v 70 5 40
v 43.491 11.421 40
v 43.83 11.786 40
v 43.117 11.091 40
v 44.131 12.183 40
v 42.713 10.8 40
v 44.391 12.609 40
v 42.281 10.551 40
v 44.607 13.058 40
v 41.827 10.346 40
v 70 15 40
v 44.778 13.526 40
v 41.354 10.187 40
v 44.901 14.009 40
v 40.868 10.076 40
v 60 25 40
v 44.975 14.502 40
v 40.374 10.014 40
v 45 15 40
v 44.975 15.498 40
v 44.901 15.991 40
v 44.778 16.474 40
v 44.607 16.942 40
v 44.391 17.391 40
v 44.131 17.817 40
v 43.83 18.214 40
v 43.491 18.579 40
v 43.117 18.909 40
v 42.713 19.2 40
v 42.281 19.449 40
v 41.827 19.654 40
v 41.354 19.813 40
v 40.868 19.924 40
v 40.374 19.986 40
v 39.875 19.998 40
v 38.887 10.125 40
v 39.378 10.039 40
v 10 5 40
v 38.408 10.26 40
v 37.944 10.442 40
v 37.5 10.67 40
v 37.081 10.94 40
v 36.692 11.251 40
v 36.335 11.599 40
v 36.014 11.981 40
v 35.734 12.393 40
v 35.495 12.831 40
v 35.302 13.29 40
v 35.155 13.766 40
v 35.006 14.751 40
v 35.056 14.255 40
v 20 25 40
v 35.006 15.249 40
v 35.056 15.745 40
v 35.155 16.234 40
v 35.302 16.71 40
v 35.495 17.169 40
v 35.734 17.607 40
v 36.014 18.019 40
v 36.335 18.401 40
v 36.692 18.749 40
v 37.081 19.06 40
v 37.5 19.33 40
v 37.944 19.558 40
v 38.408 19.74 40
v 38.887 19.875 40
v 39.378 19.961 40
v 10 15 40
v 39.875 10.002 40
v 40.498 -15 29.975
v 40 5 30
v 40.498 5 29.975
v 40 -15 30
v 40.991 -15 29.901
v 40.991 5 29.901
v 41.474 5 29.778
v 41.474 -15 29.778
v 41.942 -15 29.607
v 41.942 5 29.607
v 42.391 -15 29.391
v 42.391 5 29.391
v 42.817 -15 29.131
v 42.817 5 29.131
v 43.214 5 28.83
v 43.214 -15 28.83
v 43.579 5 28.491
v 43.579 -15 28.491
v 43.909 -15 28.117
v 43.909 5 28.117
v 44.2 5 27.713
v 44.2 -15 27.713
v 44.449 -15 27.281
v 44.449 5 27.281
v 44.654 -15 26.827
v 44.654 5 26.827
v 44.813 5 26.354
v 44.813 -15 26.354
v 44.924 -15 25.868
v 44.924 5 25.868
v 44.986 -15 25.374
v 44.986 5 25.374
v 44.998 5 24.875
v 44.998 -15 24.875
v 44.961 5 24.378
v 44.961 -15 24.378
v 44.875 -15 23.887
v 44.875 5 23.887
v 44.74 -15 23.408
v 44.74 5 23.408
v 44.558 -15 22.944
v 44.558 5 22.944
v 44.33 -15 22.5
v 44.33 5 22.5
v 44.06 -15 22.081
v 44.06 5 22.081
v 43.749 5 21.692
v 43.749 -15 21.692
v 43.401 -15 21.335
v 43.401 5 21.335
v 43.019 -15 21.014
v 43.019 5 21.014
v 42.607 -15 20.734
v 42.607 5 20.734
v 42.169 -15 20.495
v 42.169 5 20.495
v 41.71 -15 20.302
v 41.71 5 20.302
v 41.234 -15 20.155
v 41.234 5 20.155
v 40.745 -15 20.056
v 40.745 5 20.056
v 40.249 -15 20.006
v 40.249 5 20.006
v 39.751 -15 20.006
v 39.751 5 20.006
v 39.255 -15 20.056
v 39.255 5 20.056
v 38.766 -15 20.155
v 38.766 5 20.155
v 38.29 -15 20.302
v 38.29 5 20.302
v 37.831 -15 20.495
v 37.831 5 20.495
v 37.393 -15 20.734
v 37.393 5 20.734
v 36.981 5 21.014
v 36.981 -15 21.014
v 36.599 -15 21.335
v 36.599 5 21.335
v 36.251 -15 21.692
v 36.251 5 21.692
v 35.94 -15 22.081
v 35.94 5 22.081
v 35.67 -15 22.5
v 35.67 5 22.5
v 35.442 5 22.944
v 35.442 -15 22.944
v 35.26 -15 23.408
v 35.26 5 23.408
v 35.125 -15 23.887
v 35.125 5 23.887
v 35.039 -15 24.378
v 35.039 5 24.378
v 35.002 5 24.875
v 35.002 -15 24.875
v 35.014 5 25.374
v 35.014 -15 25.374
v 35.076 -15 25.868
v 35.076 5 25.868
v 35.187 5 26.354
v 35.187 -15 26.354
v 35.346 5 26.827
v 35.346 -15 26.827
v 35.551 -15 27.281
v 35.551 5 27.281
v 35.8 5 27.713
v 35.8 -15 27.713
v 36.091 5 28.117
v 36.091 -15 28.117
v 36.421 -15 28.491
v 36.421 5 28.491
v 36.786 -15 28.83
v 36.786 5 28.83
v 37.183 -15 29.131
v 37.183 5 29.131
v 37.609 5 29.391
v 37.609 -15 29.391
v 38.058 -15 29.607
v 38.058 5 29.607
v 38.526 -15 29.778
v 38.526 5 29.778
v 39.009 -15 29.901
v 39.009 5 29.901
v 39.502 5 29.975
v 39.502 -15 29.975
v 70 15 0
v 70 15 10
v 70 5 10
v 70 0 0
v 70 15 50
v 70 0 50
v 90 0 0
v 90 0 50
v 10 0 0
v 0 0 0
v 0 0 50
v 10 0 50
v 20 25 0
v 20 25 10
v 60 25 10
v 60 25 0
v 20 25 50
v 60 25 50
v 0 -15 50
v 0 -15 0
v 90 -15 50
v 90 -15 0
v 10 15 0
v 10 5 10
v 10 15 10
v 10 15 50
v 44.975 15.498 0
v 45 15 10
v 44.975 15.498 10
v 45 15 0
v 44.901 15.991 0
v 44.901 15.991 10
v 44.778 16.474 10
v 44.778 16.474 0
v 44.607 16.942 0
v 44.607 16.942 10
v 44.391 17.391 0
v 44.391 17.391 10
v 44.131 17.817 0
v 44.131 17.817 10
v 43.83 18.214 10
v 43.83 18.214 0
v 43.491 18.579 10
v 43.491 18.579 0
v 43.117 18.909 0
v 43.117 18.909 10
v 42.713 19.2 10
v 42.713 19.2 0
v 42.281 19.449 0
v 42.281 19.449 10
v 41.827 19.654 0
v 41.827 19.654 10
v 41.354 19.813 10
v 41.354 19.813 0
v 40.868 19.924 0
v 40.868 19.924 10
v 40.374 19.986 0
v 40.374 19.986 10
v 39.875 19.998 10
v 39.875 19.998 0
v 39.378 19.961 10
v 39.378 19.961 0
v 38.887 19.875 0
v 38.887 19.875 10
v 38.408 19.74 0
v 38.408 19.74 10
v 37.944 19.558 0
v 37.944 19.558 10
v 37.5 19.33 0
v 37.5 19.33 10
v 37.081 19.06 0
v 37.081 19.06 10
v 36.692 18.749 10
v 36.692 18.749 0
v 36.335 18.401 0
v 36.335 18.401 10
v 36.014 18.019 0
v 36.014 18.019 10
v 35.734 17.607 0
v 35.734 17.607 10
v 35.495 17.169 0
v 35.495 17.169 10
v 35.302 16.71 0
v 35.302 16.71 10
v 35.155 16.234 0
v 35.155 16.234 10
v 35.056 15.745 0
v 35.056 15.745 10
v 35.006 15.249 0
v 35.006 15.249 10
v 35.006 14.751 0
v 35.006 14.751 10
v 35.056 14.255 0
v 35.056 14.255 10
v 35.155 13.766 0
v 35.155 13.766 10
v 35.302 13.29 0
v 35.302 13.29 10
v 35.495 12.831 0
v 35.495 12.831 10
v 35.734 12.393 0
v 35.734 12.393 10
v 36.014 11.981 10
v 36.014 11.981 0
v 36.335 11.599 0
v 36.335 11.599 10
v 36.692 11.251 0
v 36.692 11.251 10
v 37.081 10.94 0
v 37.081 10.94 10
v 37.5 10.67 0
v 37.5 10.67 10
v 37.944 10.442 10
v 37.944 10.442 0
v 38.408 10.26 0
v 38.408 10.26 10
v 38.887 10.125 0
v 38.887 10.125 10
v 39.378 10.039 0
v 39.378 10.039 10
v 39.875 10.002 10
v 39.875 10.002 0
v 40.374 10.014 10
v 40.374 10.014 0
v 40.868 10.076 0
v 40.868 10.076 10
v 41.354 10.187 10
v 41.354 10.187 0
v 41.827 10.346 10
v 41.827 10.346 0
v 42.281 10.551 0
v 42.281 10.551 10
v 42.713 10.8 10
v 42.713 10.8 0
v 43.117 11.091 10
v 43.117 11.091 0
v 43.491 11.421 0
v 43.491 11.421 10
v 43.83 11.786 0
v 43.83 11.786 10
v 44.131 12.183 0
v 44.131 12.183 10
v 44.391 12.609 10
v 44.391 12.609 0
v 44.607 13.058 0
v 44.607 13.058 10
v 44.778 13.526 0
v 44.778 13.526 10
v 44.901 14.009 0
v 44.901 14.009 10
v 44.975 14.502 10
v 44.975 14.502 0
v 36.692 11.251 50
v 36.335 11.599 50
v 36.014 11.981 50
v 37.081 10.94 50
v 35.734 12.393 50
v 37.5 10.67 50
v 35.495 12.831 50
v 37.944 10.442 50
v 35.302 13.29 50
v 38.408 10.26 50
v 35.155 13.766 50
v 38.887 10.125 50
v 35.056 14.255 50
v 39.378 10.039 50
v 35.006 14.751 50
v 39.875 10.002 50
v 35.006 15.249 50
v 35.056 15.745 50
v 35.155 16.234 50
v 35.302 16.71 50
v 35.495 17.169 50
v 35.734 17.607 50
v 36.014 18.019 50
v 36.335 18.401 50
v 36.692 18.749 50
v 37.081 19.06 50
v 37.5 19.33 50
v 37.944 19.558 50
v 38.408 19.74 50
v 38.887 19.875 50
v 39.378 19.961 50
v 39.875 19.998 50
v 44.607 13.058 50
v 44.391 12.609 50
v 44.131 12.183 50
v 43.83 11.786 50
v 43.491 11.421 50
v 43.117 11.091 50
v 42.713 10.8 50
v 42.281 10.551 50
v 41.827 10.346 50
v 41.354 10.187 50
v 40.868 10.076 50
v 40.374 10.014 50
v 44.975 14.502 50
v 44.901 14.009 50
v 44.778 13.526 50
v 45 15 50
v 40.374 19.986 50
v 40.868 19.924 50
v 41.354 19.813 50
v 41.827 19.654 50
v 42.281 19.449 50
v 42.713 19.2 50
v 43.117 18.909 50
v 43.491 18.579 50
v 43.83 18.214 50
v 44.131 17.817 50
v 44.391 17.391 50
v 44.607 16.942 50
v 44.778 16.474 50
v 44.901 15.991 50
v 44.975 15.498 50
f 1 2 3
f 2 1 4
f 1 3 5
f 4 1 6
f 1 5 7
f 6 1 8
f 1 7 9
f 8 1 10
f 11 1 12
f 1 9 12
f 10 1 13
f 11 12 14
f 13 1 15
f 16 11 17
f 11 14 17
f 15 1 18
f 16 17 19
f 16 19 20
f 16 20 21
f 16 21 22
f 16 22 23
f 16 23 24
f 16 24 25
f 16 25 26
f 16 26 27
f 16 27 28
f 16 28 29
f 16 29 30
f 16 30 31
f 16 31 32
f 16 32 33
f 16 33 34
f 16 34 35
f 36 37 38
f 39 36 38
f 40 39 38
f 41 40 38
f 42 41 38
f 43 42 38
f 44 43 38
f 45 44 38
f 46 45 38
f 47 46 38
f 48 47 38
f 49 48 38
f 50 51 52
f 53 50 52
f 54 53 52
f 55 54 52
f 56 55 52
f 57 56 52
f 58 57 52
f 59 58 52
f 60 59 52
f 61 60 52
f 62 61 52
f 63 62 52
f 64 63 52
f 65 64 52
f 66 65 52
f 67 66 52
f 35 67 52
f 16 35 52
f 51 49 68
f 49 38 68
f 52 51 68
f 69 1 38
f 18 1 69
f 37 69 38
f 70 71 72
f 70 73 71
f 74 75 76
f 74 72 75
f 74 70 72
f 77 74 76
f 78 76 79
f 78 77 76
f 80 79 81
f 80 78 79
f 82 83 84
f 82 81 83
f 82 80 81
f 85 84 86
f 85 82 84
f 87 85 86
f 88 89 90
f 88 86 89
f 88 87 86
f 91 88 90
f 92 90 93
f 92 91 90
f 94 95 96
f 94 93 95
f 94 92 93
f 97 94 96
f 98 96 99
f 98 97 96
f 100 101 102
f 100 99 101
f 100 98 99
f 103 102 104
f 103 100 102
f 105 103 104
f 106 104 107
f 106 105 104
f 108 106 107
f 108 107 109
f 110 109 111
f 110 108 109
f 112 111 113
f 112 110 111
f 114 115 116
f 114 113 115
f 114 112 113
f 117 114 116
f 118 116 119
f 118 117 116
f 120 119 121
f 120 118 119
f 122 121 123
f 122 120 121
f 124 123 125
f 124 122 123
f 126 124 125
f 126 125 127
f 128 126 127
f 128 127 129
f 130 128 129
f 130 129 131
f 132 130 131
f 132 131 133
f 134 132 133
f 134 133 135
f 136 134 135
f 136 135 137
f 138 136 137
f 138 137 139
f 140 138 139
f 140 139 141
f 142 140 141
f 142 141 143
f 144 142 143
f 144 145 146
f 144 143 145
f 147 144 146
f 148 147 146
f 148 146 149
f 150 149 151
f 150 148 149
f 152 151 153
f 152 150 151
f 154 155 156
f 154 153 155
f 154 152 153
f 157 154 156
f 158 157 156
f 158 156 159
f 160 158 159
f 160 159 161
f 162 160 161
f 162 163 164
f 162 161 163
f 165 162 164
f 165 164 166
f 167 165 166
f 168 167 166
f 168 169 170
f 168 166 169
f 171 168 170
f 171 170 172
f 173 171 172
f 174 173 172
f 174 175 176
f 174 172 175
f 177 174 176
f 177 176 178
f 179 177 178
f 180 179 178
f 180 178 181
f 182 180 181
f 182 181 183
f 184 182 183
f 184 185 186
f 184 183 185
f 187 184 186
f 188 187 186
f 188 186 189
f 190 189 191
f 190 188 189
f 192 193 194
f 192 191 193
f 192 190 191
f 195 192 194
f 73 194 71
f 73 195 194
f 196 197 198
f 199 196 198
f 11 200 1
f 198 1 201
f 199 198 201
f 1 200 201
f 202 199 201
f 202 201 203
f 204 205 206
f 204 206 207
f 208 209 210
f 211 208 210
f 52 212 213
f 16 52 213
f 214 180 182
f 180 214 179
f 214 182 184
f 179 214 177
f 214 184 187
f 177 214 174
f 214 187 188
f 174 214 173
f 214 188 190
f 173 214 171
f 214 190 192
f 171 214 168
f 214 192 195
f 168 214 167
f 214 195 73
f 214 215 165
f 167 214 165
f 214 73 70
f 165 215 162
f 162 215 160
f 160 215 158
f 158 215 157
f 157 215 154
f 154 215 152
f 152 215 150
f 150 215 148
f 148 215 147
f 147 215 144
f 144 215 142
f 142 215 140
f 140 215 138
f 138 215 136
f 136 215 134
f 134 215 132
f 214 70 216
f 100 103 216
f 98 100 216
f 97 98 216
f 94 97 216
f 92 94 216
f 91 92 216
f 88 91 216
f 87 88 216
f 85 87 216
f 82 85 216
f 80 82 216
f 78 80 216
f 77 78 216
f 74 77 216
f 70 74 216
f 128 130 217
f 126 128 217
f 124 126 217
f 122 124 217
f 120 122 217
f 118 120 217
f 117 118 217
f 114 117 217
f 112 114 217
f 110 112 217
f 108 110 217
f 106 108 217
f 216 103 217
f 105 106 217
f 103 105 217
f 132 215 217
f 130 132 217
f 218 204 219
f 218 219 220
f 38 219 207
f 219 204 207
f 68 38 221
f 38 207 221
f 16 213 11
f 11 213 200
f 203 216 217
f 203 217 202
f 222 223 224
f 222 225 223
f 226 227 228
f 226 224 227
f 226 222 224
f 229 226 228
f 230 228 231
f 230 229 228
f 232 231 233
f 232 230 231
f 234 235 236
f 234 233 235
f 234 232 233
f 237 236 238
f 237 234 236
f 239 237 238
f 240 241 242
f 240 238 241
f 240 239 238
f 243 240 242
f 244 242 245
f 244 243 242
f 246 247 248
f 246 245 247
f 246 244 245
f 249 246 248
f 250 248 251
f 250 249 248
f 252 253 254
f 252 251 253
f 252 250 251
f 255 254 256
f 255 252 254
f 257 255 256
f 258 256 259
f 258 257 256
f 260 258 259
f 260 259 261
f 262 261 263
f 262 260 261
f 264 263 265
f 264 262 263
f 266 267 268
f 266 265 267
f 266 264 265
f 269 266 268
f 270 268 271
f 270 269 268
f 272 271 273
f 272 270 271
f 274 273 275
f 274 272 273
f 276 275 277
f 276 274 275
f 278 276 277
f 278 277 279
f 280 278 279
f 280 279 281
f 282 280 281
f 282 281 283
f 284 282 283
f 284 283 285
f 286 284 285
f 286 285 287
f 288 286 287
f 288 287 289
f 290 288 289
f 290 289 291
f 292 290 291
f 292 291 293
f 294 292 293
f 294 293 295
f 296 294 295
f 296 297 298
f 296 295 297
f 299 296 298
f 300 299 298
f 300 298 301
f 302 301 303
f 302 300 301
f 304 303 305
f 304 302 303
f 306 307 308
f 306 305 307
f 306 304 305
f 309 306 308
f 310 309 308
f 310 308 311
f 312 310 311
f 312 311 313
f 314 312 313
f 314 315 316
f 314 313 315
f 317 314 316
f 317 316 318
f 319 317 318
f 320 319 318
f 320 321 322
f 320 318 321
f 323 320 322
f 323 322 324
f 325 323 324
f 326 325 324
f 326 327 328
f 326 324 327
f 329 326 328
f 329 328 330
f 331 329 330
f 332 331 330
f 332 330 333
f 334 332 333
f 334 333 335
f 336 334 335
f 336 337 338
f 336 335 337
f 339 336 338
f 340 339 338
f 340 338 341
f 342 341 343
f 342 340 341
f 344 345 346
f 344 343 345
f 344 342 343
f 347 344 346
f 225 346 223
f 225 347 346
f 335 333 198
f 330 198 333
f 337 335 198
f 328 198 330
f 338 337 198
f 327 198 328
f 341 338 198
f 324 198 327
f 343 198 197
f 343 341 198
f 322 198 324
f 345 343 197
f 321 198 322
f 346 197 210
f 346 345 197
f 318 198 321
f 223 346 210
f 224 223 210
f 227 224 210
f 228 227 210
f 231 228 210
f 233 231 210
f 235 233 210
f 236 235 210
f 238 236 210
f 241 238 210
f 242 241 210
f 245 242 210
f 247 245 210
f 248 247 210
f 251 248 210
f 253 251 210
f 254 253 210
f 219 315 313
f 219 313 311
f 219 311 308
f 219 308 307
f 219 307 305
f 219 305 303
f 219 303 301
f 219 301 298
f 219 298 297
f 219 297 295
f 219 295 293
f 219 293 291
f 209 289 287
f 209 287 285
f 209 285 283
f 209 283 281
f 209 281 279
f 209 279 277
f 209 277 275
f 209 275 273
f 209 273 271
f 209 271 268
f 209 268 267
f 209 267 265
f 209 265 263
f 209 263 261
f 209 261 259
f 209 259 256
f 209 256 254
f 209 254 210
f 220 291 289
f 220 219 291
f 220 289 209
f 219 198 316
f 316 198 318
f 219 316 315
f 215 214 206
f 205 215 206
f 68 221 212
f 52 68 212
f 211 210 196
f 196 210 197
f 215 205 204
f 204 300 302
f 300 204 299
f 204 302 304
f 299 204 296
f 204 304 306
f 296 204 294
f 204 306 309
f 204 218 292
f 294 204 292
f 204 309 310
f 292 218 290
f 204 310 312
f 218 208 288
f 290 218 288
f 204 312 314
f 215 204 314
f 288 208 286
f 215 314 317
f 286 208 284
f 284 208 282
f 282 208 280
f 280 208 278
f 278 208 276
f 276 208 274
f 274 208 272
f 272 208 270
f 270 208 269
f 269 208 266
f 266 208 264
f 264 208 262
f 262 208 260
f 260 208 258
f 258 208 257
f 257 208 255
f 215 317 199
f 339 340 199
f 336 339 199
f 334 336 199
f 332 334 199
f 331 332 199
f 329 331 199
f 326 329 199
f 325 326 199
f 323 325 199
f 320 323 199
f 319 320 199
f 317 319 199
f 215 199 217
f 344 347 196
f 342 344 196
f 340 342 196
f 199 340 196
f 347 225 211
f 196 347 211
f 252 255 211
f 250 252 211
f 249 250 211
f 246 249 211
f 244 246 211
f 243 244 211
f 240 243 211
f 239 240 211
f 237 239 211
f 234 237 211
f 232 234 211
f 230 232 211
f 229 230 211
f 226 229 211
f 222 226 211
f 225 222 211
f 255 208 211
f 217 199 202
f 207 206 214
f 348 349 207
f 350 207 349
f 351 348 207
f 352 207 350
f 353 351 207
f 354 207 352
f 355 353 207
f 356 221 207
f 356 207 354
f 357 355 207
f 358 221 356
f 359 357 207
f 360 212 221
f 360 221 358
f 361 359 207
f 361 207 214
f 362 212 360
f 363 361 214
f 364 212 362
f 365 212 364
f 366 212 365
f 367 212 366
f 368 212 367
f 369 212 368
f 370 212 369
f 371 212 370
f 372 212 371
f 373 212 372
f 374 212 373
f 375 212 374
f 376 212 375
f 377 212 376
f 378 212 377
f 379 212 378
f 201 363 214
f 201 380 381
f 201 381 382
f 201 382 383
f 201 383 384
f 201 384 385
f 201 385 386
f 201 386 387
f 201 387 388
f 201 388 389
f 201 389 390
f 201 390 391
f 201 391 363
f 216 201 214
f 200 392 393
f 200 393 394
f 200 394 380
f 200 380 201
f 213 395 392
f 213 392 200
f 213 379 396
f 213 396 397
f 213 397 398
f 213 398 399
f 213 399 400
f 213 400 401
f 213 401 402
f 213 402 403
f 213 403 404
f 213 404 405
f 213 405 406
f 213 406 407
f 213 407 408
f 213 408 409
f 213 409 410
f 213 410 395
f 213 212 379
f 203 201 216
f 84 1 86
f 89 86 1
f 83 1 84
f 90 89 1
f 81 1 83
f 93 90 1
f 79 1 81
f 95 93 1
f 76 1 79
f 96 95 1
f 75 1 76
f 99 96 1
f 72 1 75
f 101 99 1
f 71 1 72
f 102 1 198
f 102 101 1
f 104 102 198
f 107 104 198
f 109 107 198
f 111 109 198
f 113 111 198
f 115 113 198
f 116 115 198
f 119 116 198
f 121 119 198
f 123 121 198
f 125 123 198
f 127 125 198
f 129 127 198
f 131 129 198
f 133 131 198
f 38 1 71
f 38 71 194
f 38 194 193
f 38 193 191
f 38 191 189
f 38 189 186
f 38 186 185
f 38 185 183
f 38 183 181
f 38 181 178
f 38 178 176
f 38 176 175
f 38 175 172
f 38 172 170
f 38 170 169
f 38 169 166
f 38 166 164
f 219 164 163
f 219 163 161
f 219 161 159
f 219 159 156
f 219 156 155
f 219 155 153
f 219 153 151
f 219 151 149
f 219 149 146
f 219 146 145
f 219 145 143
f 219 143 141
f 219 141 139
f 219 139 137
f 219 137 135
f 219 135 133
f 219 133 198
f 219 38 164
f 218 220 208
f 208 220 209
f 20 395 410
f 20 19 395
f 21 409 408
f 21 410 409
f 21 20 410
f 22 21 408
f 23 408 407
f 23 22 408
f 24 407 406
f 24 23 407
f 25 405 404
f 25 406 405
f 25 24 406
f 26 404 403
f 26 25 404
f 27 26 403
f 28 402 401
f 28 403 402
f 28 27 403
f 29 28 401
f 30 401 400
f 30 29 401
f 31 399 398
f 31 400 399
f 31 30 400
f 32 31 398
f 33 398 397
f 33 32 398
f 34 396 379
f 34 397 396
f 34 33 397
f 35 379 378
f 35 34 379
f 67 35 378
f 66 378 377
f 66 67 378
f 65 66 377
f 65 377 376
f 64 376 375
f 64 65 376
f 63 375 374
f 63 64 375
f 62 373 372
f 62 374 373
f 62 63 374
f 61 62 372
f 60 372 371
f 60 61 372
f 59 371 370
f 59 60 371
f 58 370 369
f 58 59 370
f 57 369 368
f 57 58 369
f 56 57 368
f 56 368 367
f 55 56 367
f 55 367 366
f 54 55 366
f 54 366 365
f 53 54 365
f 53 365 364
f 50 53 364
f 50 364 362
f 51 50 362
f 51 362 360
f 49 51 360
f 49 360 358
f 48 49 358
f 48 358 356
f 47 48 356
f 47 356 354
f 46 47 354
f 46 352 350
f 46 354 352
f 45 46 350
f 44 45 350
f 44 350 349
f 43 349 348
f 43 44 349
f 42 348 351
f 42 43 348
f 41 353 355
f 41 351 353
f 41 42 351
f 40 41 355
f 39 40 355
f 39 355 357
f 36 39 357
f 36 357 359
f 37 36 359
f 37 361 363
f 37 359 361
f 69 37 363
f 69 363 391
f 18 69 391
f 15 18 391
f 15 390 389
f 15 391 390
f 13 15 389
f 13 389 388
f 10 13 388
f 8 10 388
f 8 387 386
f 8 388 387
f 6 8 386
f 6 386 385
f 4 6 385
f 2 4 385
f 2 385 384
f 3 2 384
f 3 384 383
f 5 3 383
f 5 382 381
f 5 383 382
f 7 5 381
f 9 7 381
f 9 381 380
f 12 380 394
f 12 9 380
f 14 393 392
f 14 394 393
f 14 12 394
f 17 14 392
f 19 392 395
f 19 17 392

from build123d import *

# Parameters (mm, degrees)
SKETCH3_W                      = 90
SKETCH3_H                      = 15
BOSS_EXTRUDE1_DEPTH            = 50
BOSS_EXTRUDE2_DEPTH            = 50
SKETCH6_W                      = 40
SKETCH6_H                      = 30
CUT_EXTRUDE1_DEPTH             = 20
CUT_EXTRUDE2_REACH             = 91.791
SKETCH7_W                      = 30
SKETCH7_H                      = 14.142135623
CUT_EXTRUDE2_DIRECTION_2_DEPTH = 90.79142498
CUT_EXTRUDE3_DEPTH             = 90.582364336
CUT_EXTRUDE3_DEPTH_BACK        = 90.582364336
SKETCH8_W                      = 30
SKETCH8_H                      = 10
SKETCH9_W                      = 30
SKETCH9_H                      = 14.142135623
CUT_EXTRUDE4_DEPTH             = 10.5
CUT_EXTRUDE5_DEPTH             = 106.948100502
CUT_EXTRUDE5_DEPTH_BACK        = 106.948100502
SKETCH10_R                     = 5
CUT_EXTRUDE6_DEPTH             = 105.880884817
CUT_EXTRUDE6_DEPTH_BACK        = 105.880884817
SKETCH11_R                     = 5


with BuildPart() as part:
    # Sketch3 → Boss-Extrude1 (new body)
    with BuildSketch(Plane.XY):
        with Locations((45, -7.5)):
            Rectangle(SKETCH3_W, SKETCH3_H)
    extrude(amount=BOSS_EXTRUDE1_DEPTH)

    # Sketch5 → Boss-Extrude2 (add)
    with BuildSketch(Plane.XY.offset(50)):
        Polygon((10, 0), (10, 15), (20, 25), (60, 25), (70, 15), (70, 0), align=None)
    extrude(amount=-BOSS_EXTRUDE2_DEPTH)

    # Sketch6 → Cut-Extrude1 (cut)
    with BuildSketch(Plane(origin=(0, 25, 0), x_dir=(1, 0, 0), z_dir=(0, 1, 0))):
        with Locations((40, -25)):
            Rectangle(SKETCH6_W, SKETCH6_H)
    extrude(amount=-CUT_EXTRUDE1_DEPTH, mode=Mode.SUBTRACT)

    # Sketch7 → Cut-Extrude2 (cut, up to next)
    with BuildSketch(Plane(origin=(42.5, 42.5, 0), x_dir=(0, 0, -1), z_dir=(0.7071067811865472, 0.7071067811865479, 0)), mode=Mode.PRIVATE) as cut_extrude2_sk1:
        with Locations((-25, -31.819805153)):
            Rectangle(SKETCH7_W, SKETCH7_H)
    cut_extrude2_tool1 = extrude(cut_extrude2_sk1.sketch, amount=-CUT_EXTRUDE2_REACH, mode=Mode.PRIVATE) & part.part
    add(cut_extrude2_tool1.solids().sort_by_distance((65, 20, 25))[0], mode=Mode.SUBTRACT)

    # Sketch7 → Cut-Extrude2 direction 2 (cut)
    with BuildSketch(Plane(origin=(42.5, 42.5, 0), x_dir=(0, 0, -1), z_dir=(0.7071067811865472, 0.7071067811865479, 0))):
        with Locations((-25, -31.819805153)):
            Rectangle(SKETCH7_W, SKETCH7_H)
    extrude(amount=CUT_EXTRUDE2_DIRECTION_2_DEPTH, mode=Mode.SUBTRACT)

    # Sketch8 → Cut-Extrude3 (cut, two sides: drawn at the far end of the back side and taken through both)
    with BuildSketch(Plane(origin=(70, 0, 0), x_dir=(0, 0, -1), z_dir=(1, 0, 0)).offset(-CUT_EXTRUDE3_DEPTH_BACK)):
        with Locations((-25, 10)):
            Rectangle(SKETCH8_W, SKETCH8_H)
    extrude(amount=CUT_EXTRUDE3_DEPTH + CUT_EXTRUDE3_DEPTH_BACK, mode=Mode.SUBTRACT)

    # Sketch9 → Cut-Extrude4 (cut, symmetric)
    with BuildSketch(Plane(origin=(-2.5, 2.5, 0), x_dir=(0, 0, 1), z_dir=(-0.7071067811865477, 0.7071067811865475, 0))):
        with Locations((25, 24.748737342)):
            Rectangle(SKETCH9_W, SKETCH9_H)
    extrude(amount=CUT_EXTRUDE4_DEPTH, both=True, mode=Mode.SUBTRACT)

    # Sketch10 → Cut-Extrude5 (cut, two sides: drawn at the far end of the back side and taken through both)
    with BuildSketch(Plane.XY.offset(50).offset(-CUT_EXTRUDE5_DEPTH_BACK)):
        with Locations((40, 15)):
            Circle(SKETCH10_R)
    extrude(amount=CUT_EXTRUDE5_DEPTH + CUT_EXTRUDE5_DEPTH_BACK, mode=Mode.SUBTRACT)

    # Sketch11 → Cut-Extrude6 (cut, two sides: drawn at the far end of the back side and taken through both)
    with BuildSketch(Plane(origin=(0, 5, 0), x_dir=(1, 0, 0), z_dir=(0, 1, 0)).offset(-CUT_EXTRUDE6_DEPTH_BACK)):
        with Locations(Location((40, -25, 0), (0, 0, 270))):
            Circle(SKETCH11_R)
    extrude(amount=CUT_EXTRUDE6_DEPTH + CUT_EXTRUDE6_DEPTH_BACK, mode=Mode.SUBTRACT)


solid = part.part
